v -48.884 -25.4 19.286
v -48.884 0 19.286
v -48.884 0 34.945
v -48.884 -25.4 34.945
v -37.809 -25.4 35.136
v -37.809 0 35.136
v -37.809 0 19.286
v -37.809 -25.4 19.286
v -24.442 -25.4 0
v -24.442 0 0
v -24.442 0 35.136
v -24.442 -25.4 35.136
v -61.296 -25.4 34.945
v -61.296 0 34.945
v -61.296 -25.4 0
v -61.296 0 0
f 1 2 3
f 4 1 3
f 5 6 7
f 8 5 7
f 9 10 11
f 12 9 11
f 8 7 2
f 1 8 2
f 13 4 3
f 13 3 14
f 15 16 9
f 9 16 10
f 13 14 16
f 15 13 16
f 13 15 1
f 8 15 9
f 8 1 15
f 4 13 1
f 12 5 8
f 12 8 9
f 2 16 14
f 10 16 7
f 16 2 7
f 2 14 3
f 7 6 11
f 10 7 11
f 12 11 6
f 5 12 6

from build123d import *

# Parameters (mm, degrees)
F1_DEPTH = 25.4
F4_DEPTH = 25.4


with BuildPart() as f1:
    # F0 (on Front) → F1 (new body)
    with BuildSketch(Plane.XZ):
        Polygon((-51.1758476496, 56.7135326564), (-63.5878965259, 56.522578001), (-63.5878965259, 0), (-8.4020039067, 0), (-8.4020039067, 56.522578001), (-21.959785372, 56.522578001), (-21.959785372, 11.6482349113), (-51.1758476496, 11.6482349113), align=None)
    extrude(amount=F1_DEPTH)


with BuildPart() as f4:
    # F3 (on Front) → F4 (new body)
    with BuildSketch(Plane.XZ):
        Polygon((-61.2964443862, 34.9447019398), (-61.2964443862, 33.4170646966), (-61.2964443862, 0), (-24.4421958923, 0), (-24.4421958923, 35.1356565952), (-37.809021771, 35.1356565952), (-37.809021771, 19.2864201963), (-48.8843917847, 19.2864201963), (-48.8843917847, 34.9447019398), align=None)
    extrude(amount=F4_DEPTH)


solid = f4.part
